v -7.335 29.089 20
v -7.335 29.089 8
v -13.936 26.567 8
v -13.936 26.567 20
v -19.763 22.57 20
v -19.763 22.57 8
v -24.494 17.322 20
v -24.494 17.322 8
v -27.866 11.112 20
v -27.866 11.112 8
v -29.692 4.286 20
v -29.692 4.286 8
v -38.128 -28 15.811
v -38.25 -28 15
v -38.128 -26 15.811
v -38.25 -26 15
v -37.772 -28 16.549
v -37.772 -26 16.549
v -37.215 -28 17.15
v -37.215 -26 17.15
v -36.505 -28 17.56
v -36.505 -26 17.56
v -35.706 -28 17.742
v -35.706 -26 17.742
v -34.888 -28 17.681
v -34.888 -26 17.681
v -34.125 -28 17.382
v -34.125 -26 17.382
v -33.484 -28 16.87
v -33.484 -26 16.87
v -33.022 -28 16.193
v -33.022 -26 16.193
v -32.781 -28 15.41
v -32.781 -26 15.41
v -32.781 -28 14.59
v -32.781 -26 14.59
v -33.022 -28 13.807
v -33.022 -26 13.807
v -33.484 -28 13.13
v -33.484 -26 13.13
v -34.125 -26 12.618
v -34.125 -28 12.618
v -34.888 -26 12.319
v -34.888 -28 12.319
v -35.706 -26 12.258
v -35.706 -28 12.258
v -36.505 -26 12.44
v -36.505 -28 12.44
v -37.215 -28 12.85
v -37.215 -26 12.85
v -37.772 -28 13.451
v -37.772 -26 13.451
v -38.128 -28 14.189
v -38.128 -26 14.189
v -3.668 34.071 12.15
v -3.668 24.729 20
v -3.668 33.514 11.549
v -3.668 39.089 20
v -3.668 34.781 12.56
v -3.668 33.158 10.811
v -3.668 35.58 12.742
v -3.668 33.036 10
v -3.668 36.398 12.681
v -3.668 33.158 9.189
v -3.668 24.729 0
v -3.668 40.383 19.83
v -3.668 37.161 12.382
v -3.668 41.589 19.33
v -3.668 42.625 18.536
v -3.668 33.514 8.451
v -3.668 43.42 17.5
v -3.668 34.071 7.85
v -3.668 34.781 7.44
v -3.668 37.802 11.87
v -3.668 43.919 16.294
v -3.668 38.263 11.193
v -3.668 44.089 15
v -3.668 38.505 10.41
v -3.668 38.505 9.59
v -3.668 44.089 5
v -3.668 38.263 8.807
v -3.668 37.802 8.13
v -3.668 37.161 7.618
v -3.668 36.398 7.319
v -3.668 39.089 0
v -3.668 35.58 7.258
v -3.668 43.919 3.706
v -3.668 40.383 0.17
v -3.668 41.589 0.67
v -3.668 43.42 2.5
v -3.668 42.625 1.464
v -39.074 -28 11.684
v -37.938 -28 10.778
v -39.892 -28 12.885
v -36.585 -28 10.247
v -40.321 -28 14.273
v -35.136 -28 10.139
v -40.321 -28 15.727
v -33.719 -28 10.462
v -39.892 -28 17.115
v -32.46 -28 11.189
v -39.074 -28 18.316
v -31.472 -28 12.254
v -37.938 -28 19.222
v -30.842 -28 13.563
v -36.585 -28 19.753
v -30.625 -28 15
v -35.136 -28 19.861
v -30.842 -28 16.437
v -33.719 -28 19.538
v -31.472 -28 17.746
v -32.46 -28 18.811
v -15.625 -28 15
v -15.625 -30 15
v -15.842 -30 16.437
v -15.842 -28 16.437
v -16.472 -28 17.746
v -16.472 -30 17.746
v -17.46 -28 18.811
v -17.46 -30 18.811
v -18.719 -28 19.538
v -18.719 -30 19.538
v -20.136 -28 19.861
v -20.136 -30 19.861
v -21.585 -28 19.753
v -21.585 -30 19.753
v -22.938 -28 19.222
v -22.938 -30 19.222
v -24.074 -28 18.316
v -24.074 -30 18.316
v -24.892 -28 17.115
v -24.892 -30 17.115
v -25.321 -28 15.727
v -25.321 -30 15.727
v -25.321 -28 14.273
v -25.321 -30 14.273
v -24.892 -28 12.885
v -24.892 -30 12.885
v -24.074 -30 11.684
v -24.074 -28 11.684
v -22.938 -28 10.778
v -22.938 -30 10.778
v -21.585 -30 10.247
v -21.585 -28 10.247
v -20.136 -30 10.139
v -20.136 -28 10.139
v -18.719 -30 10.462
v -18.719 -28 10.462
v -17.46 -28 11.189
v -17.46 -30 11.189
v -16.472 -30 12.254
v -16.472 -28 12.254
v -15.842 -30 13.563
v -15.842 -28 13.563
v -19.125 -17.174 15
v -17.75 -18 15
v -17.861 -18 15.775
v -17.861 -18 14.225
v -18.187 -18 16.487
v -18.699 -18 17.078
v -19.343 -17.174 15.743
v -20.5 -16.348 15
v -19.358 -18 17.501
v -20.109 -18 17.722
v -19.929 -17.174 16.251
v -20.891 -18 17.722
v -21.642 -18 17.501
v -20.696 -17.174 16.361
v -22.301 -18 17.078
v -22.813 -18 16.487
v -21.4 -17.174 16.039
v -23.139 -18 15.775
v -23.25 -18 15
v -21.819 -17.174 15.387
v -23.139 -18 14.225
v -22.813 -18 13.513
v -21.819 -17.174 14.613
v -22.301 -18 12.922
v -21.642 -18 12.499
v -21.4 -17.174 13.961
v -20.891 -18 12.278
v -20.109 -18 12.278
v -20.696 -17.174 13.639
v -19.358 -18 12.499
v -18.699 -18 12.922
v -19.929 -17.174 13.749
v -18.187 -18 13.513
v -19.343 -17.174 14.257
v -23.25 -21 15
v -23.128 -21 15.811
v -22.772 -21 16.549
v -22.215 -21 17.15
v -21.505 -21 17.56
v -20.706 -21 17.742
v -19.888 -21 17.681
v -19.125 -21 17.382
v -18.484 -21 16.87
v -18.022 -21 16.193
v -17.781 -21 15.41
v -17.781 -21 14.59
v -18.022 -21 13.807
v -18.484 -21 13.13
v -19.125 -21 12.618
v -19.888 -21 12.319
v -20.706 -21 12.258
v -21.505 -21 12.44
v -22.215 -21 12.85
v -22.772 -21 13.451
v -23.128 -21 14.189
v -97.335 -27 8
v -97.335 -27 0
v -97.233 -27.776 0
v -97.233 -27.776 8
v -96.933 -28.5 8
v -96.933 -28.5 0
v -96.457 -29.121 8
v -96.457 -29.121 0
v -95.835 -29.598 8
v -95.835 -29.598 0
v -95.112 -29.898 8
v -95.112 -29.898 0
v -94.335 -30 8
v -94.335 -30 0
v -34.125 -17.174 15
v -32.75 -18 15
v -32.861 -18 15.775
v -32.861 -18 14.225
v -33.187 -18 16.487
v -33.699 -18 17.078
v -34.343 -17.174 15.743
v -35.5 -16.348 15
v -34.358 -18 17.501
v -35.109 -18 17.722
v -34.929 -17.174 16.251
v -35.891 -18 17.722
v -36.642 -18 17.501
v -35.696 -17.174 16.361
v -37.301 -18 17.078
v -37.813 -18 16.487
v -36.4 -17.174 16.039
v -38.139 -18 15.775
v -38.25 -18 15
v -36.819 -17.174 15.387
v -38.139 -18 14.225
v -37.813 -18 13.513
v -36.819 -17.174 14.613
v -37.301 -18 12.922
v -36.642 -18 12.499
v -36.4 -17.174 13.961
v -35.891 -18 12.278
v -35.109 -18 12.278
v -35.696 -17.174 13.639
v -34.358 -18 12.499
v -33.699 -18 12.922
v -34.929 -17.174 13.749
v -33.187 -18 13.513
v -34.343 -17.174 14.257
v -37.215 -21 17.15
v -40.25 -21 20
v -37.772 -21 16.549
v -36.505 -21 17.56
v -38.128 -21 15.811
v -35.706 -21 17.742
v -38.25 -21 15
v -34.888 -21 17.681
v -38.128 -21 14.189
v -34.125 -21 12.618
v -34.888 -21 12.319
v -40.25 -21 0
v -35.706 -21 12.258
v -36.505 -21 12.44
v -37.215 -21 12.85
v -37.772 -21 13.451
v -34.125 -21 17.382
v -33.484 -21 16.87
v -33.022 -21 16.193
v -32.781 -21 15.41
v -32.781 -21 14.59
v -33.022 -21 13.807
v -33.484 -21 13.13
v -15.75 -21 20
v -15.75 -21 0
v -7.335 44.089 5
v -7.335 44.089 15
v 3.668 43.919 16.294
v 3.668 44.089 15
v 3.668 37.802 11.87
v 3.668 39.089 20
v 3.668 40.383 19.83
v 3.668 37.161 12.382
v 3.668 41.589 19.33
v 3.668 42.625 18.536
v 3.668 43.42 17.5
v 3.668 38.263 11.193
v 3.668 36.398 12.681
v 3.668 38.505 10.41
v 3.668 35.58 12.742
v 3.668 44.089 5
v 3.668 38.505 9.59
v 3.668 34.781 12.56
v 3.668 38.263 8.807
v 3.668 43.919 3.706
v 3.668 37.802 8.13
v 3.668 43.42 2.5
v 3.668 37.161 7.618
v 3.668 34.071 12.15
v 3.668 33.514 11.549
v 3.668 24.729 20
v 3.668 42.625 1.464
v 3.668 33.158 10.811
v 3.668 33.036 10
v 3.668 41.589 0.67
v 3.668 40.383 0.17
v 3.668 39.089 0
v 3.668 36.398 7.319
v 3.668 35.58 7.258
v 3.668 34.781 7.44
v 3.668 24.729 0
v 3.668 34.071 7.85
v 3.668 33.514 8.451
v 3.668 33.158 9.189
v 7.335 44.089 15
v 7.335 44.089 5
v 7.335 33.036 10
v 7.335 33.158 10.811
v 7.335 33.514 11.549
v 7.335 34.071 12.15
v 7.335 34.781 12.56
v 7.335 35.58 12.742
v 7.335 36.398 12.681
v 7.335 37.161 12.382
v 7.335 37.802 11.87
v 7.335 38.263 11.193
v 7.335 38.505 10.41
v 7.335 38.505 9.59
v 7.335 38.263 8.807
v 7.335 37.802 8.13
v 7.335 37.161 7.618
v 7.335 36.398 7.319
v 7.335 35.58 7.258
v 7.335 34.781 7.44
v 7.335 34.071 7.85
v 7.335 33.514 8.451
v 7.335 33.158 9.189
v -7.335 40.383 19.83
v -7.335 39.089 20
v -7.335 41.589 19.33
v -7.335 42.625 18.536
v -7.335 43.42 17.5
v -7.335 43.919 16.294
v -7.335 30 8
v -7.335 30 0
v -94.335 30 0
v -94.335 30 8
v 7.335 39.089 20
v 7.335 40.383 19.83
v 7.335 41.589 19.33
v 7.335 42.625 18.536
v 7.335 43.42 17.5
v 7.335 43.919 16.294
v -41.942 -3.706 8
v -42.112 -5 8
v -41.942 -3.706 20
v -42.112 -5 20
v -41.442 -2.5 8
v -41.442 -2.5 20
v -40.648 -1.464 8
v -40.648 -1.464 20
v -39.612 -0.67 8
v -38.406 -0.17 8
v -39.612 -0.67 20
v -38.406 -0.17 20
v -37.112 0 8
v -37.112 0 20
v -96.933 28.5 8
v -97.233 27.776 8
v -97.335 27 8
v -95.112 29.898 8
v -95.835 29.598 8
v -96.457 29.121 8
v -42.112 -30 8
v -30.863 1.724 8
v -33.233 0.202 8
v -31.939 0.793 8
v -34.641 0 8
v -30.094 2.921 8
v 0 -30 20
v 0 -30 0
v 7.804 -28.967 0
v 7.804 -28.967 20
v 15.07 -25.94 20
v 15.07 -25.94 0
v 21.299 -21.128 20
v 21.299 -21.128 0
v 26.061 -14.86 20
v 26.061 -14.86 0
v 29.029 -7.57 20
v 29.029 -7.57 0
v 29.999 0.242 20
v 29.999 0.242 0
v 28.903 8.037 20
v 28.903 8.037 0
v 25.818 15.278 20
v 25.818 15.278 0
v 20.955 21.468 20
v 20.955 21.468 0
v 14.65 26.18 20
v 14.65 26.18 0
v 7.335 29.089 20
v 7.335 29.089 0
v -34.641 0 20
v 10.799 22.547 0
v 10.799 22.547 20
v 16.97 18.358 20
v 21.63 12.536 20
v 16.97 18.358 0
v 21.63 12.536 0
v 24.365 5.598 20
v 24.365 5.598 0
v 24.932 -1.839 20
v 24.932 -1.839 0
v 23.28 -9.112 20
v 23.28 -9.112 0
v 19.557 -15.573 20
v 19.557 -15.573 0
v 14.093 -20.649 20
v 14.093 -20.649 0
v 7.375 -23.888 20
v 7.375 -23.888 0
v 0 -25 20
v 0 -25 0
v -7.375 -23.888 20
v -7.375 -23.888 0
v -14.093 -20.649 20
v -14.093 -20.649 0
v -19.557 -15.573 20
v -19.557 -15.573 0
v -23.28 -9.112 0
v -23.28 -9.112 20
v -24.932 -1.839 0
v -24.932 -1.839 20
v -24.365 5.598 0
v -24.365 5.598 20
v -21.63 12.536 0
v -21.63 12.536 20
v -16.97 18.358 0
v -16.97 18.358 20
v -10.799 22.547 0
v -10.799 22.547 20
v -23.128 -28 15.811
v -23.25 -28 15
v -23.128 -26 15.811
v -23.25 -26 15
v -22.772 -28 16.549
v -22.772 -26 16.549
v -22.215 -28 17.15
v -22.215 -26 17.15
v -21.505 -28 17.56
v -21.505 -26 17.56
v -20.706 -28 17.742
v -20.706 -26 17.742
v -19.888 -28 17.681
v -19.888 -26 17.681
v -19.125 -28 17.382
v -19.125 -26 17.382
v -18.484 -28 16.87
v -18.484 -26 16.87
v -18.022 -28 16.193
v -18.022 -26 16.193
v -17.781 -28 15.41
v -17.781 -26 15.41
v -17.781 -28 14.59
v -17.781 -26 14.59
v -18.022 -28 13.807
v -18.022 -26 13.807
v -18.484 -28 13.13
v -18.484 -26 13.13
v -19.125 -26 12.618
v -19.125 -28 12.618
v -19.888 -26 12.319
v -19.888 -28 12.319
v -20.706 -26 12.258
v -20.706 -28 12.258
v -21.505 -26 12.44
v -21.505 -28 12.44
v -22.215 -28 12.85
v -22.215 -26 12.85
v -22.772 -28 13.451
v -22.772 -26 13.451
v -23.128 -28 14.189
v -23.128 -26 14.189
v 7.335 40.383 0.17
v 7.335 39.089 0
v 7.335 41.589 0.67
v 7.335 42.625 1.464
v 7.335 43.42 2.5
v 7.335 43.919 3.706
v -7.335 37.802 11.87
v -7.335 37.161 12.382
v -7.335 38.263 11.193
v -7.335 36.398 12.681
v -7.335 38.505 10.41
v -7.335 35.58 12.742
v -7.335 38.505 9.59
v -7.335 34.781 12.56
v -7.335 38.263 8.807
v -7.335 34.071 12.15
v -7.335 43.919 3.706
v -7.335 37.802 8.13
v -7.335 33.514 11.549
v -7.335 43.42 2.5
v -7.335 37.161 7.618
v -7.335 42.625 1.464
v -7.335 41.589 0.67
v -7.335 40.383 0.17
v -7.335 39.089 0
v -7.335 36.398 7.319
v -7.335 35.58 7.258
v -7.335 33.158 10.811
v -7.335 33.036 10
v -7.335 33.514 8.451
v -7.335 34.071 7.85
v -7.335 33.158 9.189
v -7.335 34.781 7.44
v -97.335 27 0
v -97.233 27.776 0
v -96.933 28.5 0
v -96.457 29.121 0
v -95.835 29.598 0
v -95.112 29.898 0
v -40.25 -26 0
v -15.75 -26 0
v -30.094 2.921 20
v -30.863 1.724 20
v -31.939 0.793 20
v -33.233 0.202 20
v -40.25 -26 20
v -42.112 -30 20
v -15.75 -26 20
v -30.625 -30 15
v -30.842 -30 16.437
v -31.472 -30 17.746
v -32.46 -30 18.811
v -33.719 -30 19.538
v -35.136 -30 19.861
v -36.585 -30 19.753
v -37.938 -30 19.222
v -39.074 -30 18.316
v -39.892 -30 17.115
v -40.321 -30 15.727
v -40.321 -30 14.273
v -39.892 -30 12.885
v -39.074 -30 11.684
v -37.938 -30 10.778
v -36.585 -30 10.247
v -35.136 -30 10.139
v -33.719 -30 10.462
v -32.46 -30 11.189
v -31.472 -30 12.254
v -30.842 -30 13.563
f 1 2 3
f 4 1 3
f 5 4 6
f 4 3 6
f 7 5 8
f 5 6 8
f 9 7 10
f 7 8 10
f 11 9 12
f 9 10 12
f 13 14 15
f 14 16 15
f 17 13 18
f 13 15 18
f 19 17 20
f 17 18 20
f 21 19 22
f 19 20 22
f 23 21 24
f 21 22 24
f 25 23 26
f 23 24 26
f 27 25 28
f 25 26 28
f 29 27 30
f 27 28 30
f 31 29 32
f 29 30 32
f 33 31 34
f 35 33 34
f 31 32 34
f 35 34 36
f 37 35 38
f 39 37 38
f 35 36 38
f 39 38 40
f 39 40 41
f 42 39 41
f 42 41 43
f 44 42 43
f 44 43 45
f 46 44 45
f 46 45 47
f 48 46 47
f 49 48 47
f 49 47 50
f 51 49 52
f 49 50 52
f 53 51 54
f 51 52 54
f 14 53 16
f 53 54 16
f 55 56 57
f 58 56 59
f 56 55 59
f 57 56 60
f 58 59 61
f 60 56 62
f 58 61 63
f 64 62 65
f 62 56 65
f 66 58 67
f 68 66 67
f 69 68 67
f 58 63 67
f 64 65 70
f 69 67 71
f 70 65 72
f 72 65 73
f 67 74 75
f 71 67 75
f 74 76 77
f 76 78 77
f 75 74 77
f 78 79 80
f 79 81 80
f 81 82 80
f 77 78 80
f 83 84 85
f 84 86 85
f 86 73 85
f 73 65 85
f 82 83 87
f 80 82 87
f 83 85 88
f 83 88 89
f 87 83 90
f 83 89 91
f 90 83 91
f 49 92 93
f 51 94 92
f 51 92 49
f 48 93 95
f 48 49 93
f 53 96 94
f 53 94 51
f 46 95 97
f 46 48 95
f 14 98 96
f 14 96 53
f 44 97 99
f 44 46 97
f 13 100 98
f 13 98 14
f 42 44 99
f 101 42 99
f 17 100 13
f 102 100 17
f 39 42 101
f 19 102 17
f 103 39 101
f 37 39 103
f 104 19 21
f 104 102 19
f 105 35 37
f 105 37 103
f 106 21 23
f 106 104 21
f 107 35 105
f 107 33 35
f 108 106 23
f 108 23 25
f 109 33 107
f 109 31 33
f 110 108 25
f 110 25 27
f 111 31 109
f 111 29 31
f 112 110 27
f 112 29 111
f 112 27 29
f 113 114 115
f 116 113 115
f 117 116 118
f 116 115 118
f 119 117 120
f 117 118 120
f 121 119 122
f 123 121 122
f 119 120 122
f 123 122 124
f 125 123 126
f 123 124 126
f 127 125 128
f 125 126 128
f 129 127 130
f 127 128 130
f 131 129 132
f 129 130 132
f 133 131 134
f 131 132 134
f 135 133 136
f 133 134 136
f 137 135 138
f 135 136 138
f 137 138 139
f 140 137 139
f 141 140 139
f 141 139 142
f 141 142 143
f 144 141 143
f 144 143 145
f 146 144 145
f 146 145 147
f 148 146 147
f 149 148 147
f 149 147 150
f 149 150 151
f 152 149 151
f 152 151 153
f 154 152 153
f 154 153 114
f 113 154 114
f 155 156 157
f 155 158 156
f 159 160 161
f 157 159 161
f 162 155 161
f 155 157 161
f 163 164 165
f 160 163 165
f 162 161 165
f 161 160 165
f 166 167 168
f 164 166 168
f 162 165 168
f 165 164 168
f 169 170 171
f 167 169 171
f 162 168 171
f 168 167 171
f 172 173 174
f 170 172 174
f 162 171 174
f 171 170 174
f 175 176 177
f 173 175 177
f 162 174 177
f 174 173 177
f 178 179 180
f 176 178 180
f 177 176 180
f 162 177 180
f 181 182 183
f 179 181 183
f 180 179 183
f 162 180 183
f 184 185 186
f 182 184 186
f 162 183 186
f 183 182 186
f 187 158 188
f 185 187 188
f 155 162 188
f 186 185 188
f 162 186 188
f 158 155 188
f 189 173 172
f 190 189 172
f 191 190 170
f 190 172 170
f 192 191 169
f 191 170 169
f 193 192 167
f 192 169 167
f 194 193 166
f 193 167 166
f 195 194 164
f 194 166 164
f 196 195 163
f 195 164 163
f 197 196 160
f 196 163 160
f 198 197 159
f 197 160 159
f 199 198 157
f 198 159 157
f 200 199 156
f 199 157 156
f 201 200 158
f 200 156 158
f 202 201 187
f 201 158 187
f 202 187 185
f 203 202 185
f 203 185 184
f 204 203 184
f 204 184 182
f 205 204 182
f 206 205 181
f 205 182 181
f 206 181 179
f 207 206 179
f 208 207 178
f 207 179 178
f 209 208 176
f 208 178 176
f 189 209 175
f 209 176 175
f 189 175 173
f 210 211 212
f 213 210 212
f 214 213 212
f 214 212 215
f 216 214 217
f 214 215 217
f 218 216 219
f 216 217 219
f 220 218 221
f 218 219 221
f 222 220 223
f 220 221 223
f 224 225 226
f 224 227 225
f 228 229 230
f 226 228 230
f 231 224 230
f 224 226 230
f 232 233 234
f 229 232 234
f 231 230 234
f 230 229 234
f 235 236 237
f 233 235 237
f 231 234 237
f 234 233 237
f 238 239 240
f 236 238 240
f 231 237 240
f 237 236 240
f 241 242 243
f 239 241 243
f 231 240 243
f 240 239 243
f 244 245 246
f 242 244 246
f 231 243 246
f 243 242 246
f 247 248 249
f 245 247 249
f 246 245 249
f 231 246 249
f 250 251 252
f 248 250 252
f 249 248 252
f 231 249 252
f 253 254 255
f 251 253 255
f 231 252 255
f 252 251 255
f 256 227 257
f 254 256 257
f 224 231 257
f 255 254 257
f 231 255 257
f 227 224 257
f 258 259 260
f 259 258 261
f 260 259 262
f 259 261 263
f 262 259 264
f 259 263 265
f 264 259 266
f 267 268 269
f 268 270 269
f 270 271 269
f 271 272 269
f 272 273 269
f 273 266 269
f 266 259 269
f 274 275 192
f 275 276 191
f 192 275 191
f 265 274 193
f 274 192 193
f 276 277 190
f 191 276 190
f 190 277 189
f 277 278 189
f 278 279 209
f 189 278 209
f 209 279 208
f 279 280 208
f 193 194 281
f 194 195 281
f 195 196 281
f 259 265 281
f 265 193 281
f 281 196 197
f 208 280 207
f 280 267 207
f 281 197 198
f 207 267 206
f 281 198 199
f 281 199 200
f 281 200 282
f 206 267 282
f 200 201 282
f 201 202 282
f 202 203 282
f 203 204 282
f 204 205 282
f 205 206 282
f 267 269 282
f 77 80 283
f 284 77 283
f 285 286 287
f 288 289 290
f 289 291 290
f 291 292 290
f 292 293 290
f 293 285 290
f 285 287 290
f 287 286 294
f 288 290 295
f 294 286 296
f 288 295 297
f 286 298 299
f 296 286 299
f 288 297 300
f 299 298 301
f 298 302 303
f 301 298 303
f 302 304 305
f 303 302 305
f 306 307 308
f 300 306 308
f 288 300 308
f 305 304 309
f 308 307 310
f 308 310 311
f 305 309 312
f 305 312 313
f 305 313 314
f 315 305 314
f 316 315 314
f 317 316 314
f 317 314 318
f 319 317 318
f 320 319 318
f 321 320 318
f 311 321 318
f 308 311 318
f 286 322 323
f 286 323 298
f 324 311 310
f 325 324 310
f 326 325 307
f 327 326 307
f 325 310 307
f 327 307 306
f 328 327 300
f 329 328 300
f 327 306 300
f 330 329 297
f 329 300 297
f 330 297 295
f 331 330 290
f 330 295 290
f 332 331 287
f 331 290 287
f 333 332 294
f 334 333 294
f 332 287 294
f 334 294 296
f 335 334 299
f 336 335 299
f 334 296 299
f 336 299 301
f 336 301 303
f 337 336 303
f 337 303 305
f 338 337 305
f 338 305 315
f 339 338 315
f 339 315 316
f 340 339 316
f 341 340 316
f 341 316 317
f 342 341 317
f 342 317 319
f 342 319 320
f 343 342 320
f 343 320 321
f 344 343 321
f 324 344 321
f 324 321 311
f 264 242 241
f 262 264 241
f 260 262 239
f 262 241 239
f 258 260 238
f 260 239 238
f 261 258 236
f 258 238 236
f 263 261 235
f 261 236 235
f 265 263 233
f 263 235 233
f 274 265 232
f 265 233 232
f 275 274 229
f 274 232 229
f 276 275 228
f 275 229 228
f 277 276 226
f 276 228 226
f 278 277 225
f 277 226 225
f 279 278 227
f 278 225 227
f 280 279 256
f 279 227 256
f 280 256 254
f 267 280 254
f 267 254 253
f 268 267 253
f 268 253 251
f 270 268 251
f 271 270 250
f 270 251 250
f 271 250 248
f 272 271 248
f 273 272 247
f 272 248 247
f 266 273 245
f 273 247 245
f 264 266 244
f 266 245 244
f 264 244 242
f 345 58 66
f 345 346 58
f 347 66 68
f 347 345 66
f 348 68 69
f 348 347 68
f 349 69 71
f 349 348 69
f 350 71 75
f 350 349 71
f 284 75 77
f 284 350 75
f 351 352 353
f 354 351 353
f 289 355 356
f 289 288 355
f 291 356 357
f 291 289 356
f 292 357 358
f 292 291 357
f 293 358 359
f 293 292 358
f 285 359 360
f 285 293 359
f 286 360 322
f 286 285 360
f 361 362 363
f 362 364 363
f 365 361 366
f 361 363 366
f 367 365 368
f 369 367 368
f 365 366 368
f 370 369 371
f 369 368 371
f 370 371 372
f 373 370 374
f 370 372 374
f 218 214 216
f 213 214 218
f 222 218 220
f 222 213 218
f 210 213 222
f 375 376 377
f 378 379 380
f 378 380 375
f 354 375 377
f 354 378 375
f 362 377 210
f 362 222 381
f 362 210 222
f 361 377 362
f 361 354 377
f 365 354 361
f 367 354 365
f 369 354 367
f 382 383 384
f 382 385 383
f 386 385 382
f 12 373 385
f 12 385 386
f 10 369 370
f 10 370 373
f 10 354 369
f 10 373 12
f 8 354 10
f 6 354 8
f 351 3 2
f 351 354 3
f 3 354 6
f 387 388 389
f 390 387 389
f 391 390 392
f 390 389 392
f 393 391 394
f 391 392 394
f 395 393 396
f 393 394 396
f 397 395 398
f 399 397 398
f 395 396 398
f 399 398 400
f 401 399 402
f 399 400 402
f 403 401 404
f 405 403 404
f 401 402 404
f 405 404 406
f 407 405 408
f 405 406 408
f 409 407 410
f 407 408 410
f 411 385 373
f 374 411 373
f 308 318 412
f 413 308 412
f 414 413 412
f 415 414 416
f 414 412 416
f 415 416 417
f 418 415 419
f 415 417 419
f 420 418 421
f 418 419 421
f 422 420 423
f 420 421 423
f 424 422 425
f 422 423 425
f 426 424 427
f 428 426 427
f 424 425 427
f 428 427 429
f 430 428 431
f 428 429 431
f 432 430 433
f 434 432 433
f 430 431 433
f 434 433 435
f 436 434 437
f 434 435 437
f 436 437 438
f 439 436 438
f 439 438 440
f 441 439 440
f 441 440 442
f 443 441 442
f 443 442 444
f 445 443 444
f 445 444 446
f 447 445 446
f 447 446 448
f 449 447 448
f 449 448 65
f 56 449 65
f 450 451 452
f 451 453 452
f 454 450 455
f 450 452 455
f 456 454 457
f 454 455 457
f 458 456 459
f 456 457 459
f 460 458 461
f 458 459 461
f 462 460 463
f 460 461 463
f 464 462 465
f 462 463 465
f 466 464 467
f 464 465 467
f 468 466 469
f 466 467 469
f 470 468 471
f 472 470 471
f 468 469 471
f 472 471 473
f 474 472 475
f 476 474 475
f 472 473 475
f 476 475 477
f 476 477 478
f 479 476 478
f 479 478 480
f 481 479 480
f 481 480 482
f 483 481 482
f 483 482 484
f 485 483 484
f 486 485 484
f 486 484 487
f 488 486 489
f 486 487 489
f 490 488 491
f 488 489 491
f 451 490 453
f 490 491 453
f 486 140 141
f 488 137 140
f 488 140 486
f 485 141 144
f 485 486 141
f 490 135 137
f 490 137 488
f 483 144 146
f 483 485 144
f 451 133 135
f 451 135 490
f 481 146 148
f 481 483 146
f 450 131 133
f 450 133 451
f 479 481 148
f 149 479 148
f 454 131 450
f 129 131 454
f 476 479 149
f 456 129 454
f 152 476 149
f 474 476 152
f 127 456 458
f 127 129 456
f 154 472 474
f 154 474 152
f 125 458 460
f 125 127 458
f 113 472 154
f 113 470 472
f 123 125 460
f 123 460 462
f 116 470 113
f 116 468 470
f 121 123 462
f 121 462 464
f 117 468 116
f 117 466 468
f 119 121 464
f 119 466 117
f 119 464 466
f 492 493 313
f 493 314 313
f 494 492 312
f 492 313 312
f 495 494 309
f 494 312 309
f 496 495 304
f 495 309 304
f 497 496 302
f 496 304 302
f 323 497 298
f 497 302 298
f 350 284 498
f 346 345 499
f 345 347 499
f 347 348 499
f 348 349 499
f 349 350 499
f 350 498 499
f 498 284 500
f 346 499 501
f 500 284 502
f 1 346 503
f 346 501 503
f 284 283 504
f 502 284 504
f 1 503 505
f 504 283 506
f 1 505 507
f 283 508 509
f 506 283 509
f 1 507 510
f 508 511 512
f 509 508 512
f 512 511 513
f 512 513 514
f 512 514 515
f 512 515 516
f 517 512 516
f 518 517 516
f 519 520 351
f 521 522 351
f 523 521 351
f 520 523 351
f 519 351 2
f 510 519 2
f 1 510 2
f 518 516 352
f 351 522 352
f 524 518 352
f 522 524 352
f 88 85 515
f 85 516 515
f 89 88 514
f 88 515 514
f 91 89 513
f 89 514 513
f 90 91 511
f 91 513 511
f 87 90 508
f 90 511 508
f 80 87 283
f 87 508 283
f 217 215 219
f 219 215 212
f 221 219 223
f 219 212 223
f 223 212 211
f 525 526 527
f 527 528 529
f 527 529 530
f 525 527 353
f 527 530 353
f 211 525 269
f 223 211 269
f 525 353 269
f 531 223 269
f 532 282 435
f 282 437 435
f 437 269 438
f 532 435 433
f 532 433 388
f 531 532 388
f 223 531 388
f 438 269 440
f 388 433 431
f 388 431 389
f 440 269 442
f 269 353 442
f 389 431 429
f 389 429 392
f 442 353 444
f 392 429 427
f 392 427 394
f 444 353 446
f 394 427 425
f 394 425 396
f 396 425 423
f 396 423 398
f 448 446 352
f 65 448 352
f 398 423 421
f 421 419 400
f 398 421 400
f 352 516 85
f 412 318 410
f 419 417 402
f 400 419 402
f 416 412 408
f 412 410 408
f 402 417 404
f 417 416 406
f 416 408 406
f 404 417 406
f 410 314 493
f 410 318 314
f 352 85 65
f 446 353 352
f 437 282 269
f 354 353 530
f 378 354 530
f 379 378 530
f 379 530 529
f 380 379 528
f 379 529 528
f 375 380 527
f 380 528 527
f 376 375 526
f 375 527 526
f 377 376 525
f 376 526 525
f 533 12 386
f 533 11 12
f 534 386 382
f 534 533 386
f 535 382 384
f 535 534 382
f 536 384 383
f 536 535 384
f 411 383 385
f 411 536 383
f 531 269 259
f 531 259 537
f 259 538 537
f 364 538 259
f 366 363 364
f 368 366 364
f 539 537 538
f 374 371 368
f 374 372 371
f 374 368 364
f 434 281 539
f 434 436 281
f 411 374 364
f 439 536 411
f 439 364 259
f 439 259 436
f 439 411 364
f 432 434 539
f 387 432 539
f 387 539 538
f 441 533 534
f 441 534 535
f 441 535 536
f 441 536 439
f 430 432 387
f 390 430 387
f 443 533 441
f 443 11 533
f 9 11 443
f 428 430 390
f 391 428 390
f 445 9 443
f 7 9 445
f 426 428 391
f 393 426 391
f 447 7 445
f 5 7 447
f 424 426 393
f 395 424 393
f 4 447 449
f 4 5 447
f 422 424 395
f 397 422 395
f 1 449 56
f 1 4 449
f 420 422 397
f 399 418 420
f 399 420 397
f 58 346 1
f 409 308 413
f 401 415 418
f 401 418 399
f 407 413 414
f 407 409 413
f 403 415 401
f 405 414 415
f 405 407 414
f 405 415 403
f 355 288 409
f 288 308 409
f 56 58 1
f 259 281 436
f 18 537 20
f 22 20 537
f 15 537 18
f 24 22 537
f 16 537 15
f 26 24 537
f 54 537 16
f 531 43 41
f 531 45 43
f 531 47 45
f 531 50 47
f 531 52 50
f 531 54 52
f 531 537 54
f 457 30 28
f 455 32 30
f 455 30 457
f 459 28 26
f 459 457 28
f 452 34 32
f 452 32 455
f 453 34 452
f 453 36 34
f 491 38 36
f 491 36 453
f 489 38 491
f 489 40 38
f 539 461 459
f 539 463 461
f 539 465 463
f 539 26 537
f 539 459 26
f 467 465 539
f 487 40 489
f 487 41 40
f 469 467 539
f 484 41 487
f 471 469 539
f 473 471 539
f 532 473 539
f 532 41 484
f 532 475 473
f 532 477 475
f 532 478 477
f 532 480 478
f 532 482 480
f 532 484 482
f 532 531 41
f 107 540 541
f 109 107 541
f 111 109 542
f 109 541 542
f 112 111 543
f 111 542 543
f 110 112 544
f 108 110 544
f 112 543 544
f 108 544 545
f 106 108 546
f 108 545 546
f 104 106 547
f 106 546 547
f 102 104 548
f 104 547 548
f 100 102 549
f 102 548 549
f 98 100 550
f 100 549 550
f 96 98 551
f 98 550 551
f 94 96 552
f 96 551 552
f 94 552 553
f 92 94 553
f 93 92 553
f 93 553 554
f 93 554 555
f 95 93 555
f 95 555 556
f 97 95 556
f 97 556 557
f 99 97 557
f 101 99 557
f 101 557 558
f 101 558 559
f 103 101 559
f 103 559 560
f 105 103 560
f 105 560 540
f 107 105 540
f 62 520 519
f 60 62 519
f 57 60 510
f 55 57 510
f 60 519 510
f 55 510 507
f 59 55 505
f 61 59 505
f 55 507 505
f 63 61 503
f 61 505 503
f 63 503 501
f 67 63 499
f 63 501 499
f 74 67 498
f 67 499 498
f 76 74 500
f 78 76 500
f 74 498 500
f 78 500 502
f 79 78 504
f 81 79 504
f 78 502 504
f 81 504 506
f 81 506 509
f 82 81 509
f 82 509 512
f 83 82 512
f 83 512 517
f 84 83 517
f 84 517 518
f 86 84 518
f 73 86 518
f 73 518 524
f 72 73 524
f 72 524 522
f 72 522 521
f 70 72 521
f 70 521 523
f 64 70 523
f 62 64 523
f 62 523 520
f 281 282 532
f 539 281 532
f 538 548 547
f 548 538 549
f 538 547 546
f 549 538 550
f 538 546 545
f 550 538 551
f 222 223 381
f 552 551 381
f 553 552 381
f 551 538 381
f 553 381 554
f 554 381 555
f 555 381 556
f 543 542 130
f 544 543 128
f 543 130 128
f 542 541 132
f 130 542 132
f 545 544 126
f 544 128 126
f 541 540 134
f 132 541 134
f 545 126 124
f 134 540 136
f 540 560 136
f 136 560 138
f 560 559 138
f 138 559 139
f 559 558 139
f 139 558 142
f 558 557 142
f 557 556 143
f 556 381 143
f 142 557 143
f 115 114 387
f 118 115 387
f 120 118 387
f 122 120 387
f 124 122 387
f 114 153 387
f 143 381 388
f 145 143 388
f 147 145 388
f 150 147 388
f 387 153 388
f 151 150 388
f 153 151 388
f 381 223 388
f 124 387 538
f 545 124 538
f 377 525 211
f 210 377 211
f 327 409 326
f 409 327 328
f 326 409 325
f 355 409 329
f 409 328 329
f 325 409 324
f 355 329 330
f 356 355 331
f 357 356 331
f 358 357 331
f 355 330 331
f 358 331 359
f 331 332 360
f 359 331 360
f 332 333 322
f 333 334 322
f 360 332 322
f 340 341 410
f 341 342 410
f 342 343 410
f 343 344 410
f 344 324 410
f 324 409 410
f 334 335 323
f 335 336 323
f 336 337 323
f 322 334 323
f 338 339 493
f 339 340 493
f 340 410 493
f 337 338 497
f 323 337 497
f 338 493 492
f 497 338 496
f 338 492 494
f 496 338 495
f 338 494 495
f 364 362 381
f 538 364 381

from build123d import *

# Parameters (mm, degrees)
F1_DEPTH        = 20
F2_DEPTH        = 8
F3_DEPTH        = 20
F4_R            = 5
F6_D            = 5.5
F7_R            = 5
F8_W            = 24.5
F8_H            = 5
F9_DEPTH        = 25
F11_D           = 5.5
F11_DEPTH       = 12
F11_CBORE_D     = 9.75
F11_CBORE_DEPTH = 2
F11_TIP         = 1.6523667023


with BuildPart() as f1:
    # F0 (on Top) → F1 (new body)
    with BuildSketch(Plane.XY):
        with BuildLine():
            Line((-7.3353787871, 29.9999998754), (-7.3353787871, 29.0893831246))
            ThreePointArc((-7.3353787871, 29.0893831246), (-23.6649673064, 18.4382568295), (-29.9999998754, 0))
            ThreePointArc((-29.9999998754, 0), (-21.2132033475, -21.2132033475), (0, -29.9999998754))
            ThreePointArc((0, -29.9999998754), (29.7714752963, -3.6958424215), (7.3353787871, 29.0893831246))
            Line((7.3353787871, 29.0893831246), (7.3353787871, 44.0893831246))
            Line((7.3353787871, 44.0893831246), (3.6676893936, 44.0893831246))
            Line((3.6676893936, 44.0893831246), (3.6676893936, 24.7294976599))
            ThreePointArc((3.6676893936, 24.7294976599), (0, -25), (-3.6676893936, 24.7294976599))
            Line((-3.6676893936, 24.7294976599), (-3.6676893936, 44.0893831246))
            Line((-3.6676893936, 44.0893831246), (-7.3353787871, 44.0893831246))
            Line((-7.3353787871, 44.0893831246), (-7.3353787871, 29.9999998754))
        make_face()
    extrude(amount=F1_DEPTH)

    # F0 (on Top) → F2 (join)
    with BuildSketch(Plane.XY):
        with BuildLine():
            Line((-7.3353787871, 29.9999998754), (-7.3353787871, 29.0893831246))
            ThreePointArc((-7.3353787871, 29.0893831246), (-23.6649673064, 18.4382568295), (-29.9999998754, 0))
            ThreePointArc((-29.9999998754, 0), (-21.2132033475, -21.2132033475), (0, -29.9999998754))
            ThreePointArc((0, -29.9999998754), (29.7714752963, -3.6958424215), (7.3353787871, 29.0893831246))
            Line((7.3353787871, 29.0893831246), (7.3353787871, 44.0893831246))
            Line((7.3353787871, 44.0893831246), (3.6676893936, 44.0893831246))
            Line((3.6676893936, 44.0893831246), (3.6676893936, 24.7294976599))
            ThreePointArc((3.6676893936, 24.7294976599), (0, -25), (-3.6676893936, 24.7294976599))
            Line((-3.6676893936, 24.7294976599), (-3.6676893936, 44.0893831246))
            Line((-3.6676893936, 44.0893831246), (-7.3353787871, 44.0893831246))
            Line((-7.3353787871, 44.0893831246), (-7.3353787871, 29.9999998754))
        make_face()
        with BuildLine():
            ThreePointArc((-29.9999998754, 0), (-23.6649673064, 18.4382568295), (-7.3353787871, 29.0893831246))
            Line((-7.3353787871, 29.0893831246), (-7.3353787871, 29.9999998754))
            Line((-7.3353787871, 29.9999998754), (-94.3353787871, 29.9999998754))
            ThreePointArc((-94.3353787871, 29.9999998754), (-96.4566991307, 29.1213202189), (-97.3353787871, 26.9999998754))
            Line((-97.3353787871, 26.9999998754), (-97.3353787871, -26.9999998754))
            ThreePointArc((-97.3353787871, -26.9999998754), (-96.4566991307, -29.1213202189), (-94.3353787871, -29.9999998754))
            Line((-94.3353787871, -29.9999998754), (-42.1122722328, -29.9999998754))
            Line((-42.1122722328, -29.9999998754), (-42.1122722328, 0))
            Line((-42.1122722328, 0), (-29.9999998754, 0))
        make_face()
        with BuildLine():
            ThreePointArc((0, -29.9999998754), (-21.2132033475, -21.2132033475), (-29.9999998754, 0))
            Line((-29.9999998754, 0), (-42.1122722328, 0))
            Line((-42.1122722328, 0), (-42.1122722328, -29.9999998754))
            Line((-42.1122722328, -29.9999998754), (0, -29.9999998754))
        make_face()
    extrude(amount=F2_DEPTH)

    # F0 (on Top) → F3 (join)
    with BuildSketch(Plane.XY):
        with BuildLine():
            ThreePointArc((0, -29.9999998754), (-21.2132033475, -21.2132033475), (-29.9999998754, 0))
            Line((-29.9999998754, 0), (-42.1122722328, 0))
            Line((-42.1122722328, 0), (-42.1122722328, -29.9999998754))
            Line((-42.1122722328, -29.9999998754), (0, -29.9999998754))
        make_face()
    extrude(amount=F3_DEPTH)

    # F4
    f4_edges = [f1.edges().sort_by_distance(p)[0] for p in [
        (5.501534, 44.089383, 0),
        (-5.501534, 44.089383, 0),
        (-5.501534, 44.089383, 20),
        (5.501534, 44.089383, 20),
    ]]
    fillet(f4_edges, radius=F4_R)

    # F6 (through all)
    with Locations(Plane.YZ.offset(7.3353787871)):
        with Locations((35.7856750488, 10)):
            Hole(F6_D / 2)

    # F7
    f7_edges = [f1.edges().sort_by_distance(p)[0] for p in [
        (-42.112272, 0, 14),
        (-30, 0, 14),
    ]]
    fillet(f7_edges, radius=F7_R)

    # F8 (on face) → F9 (cut)
    with BuildSketch(Plane(origin=(0, 0, 0), x_dir=(1, 0, 0), z_dir=(0, 0, -1))):
        with Locations((-28, 23.4999998754)):
            Rectangle(F8_W, F8_H)
    extrude(amount=-F9_DEPTH, mode=Mode.SUBTRACT)

    # F11
    with Locations(Plane.XZ.offset(29.9999998754)):
        with Locations((-35.5, 15), (-20.5, 15)):
            CounterBoreHole(F11_D / 2, F11_CBORE_D / 2, F11_CBORE_DEPTH, depth=F11_DEPTH)
            with Locations((0, 0, -(F11_DEPTH + F11_TIP / 2))):  # 118° drill point
                Cone(0, F11_D / 2, F11_TIP, mode=Mode.SUBTRACT)


solid = f1.part
